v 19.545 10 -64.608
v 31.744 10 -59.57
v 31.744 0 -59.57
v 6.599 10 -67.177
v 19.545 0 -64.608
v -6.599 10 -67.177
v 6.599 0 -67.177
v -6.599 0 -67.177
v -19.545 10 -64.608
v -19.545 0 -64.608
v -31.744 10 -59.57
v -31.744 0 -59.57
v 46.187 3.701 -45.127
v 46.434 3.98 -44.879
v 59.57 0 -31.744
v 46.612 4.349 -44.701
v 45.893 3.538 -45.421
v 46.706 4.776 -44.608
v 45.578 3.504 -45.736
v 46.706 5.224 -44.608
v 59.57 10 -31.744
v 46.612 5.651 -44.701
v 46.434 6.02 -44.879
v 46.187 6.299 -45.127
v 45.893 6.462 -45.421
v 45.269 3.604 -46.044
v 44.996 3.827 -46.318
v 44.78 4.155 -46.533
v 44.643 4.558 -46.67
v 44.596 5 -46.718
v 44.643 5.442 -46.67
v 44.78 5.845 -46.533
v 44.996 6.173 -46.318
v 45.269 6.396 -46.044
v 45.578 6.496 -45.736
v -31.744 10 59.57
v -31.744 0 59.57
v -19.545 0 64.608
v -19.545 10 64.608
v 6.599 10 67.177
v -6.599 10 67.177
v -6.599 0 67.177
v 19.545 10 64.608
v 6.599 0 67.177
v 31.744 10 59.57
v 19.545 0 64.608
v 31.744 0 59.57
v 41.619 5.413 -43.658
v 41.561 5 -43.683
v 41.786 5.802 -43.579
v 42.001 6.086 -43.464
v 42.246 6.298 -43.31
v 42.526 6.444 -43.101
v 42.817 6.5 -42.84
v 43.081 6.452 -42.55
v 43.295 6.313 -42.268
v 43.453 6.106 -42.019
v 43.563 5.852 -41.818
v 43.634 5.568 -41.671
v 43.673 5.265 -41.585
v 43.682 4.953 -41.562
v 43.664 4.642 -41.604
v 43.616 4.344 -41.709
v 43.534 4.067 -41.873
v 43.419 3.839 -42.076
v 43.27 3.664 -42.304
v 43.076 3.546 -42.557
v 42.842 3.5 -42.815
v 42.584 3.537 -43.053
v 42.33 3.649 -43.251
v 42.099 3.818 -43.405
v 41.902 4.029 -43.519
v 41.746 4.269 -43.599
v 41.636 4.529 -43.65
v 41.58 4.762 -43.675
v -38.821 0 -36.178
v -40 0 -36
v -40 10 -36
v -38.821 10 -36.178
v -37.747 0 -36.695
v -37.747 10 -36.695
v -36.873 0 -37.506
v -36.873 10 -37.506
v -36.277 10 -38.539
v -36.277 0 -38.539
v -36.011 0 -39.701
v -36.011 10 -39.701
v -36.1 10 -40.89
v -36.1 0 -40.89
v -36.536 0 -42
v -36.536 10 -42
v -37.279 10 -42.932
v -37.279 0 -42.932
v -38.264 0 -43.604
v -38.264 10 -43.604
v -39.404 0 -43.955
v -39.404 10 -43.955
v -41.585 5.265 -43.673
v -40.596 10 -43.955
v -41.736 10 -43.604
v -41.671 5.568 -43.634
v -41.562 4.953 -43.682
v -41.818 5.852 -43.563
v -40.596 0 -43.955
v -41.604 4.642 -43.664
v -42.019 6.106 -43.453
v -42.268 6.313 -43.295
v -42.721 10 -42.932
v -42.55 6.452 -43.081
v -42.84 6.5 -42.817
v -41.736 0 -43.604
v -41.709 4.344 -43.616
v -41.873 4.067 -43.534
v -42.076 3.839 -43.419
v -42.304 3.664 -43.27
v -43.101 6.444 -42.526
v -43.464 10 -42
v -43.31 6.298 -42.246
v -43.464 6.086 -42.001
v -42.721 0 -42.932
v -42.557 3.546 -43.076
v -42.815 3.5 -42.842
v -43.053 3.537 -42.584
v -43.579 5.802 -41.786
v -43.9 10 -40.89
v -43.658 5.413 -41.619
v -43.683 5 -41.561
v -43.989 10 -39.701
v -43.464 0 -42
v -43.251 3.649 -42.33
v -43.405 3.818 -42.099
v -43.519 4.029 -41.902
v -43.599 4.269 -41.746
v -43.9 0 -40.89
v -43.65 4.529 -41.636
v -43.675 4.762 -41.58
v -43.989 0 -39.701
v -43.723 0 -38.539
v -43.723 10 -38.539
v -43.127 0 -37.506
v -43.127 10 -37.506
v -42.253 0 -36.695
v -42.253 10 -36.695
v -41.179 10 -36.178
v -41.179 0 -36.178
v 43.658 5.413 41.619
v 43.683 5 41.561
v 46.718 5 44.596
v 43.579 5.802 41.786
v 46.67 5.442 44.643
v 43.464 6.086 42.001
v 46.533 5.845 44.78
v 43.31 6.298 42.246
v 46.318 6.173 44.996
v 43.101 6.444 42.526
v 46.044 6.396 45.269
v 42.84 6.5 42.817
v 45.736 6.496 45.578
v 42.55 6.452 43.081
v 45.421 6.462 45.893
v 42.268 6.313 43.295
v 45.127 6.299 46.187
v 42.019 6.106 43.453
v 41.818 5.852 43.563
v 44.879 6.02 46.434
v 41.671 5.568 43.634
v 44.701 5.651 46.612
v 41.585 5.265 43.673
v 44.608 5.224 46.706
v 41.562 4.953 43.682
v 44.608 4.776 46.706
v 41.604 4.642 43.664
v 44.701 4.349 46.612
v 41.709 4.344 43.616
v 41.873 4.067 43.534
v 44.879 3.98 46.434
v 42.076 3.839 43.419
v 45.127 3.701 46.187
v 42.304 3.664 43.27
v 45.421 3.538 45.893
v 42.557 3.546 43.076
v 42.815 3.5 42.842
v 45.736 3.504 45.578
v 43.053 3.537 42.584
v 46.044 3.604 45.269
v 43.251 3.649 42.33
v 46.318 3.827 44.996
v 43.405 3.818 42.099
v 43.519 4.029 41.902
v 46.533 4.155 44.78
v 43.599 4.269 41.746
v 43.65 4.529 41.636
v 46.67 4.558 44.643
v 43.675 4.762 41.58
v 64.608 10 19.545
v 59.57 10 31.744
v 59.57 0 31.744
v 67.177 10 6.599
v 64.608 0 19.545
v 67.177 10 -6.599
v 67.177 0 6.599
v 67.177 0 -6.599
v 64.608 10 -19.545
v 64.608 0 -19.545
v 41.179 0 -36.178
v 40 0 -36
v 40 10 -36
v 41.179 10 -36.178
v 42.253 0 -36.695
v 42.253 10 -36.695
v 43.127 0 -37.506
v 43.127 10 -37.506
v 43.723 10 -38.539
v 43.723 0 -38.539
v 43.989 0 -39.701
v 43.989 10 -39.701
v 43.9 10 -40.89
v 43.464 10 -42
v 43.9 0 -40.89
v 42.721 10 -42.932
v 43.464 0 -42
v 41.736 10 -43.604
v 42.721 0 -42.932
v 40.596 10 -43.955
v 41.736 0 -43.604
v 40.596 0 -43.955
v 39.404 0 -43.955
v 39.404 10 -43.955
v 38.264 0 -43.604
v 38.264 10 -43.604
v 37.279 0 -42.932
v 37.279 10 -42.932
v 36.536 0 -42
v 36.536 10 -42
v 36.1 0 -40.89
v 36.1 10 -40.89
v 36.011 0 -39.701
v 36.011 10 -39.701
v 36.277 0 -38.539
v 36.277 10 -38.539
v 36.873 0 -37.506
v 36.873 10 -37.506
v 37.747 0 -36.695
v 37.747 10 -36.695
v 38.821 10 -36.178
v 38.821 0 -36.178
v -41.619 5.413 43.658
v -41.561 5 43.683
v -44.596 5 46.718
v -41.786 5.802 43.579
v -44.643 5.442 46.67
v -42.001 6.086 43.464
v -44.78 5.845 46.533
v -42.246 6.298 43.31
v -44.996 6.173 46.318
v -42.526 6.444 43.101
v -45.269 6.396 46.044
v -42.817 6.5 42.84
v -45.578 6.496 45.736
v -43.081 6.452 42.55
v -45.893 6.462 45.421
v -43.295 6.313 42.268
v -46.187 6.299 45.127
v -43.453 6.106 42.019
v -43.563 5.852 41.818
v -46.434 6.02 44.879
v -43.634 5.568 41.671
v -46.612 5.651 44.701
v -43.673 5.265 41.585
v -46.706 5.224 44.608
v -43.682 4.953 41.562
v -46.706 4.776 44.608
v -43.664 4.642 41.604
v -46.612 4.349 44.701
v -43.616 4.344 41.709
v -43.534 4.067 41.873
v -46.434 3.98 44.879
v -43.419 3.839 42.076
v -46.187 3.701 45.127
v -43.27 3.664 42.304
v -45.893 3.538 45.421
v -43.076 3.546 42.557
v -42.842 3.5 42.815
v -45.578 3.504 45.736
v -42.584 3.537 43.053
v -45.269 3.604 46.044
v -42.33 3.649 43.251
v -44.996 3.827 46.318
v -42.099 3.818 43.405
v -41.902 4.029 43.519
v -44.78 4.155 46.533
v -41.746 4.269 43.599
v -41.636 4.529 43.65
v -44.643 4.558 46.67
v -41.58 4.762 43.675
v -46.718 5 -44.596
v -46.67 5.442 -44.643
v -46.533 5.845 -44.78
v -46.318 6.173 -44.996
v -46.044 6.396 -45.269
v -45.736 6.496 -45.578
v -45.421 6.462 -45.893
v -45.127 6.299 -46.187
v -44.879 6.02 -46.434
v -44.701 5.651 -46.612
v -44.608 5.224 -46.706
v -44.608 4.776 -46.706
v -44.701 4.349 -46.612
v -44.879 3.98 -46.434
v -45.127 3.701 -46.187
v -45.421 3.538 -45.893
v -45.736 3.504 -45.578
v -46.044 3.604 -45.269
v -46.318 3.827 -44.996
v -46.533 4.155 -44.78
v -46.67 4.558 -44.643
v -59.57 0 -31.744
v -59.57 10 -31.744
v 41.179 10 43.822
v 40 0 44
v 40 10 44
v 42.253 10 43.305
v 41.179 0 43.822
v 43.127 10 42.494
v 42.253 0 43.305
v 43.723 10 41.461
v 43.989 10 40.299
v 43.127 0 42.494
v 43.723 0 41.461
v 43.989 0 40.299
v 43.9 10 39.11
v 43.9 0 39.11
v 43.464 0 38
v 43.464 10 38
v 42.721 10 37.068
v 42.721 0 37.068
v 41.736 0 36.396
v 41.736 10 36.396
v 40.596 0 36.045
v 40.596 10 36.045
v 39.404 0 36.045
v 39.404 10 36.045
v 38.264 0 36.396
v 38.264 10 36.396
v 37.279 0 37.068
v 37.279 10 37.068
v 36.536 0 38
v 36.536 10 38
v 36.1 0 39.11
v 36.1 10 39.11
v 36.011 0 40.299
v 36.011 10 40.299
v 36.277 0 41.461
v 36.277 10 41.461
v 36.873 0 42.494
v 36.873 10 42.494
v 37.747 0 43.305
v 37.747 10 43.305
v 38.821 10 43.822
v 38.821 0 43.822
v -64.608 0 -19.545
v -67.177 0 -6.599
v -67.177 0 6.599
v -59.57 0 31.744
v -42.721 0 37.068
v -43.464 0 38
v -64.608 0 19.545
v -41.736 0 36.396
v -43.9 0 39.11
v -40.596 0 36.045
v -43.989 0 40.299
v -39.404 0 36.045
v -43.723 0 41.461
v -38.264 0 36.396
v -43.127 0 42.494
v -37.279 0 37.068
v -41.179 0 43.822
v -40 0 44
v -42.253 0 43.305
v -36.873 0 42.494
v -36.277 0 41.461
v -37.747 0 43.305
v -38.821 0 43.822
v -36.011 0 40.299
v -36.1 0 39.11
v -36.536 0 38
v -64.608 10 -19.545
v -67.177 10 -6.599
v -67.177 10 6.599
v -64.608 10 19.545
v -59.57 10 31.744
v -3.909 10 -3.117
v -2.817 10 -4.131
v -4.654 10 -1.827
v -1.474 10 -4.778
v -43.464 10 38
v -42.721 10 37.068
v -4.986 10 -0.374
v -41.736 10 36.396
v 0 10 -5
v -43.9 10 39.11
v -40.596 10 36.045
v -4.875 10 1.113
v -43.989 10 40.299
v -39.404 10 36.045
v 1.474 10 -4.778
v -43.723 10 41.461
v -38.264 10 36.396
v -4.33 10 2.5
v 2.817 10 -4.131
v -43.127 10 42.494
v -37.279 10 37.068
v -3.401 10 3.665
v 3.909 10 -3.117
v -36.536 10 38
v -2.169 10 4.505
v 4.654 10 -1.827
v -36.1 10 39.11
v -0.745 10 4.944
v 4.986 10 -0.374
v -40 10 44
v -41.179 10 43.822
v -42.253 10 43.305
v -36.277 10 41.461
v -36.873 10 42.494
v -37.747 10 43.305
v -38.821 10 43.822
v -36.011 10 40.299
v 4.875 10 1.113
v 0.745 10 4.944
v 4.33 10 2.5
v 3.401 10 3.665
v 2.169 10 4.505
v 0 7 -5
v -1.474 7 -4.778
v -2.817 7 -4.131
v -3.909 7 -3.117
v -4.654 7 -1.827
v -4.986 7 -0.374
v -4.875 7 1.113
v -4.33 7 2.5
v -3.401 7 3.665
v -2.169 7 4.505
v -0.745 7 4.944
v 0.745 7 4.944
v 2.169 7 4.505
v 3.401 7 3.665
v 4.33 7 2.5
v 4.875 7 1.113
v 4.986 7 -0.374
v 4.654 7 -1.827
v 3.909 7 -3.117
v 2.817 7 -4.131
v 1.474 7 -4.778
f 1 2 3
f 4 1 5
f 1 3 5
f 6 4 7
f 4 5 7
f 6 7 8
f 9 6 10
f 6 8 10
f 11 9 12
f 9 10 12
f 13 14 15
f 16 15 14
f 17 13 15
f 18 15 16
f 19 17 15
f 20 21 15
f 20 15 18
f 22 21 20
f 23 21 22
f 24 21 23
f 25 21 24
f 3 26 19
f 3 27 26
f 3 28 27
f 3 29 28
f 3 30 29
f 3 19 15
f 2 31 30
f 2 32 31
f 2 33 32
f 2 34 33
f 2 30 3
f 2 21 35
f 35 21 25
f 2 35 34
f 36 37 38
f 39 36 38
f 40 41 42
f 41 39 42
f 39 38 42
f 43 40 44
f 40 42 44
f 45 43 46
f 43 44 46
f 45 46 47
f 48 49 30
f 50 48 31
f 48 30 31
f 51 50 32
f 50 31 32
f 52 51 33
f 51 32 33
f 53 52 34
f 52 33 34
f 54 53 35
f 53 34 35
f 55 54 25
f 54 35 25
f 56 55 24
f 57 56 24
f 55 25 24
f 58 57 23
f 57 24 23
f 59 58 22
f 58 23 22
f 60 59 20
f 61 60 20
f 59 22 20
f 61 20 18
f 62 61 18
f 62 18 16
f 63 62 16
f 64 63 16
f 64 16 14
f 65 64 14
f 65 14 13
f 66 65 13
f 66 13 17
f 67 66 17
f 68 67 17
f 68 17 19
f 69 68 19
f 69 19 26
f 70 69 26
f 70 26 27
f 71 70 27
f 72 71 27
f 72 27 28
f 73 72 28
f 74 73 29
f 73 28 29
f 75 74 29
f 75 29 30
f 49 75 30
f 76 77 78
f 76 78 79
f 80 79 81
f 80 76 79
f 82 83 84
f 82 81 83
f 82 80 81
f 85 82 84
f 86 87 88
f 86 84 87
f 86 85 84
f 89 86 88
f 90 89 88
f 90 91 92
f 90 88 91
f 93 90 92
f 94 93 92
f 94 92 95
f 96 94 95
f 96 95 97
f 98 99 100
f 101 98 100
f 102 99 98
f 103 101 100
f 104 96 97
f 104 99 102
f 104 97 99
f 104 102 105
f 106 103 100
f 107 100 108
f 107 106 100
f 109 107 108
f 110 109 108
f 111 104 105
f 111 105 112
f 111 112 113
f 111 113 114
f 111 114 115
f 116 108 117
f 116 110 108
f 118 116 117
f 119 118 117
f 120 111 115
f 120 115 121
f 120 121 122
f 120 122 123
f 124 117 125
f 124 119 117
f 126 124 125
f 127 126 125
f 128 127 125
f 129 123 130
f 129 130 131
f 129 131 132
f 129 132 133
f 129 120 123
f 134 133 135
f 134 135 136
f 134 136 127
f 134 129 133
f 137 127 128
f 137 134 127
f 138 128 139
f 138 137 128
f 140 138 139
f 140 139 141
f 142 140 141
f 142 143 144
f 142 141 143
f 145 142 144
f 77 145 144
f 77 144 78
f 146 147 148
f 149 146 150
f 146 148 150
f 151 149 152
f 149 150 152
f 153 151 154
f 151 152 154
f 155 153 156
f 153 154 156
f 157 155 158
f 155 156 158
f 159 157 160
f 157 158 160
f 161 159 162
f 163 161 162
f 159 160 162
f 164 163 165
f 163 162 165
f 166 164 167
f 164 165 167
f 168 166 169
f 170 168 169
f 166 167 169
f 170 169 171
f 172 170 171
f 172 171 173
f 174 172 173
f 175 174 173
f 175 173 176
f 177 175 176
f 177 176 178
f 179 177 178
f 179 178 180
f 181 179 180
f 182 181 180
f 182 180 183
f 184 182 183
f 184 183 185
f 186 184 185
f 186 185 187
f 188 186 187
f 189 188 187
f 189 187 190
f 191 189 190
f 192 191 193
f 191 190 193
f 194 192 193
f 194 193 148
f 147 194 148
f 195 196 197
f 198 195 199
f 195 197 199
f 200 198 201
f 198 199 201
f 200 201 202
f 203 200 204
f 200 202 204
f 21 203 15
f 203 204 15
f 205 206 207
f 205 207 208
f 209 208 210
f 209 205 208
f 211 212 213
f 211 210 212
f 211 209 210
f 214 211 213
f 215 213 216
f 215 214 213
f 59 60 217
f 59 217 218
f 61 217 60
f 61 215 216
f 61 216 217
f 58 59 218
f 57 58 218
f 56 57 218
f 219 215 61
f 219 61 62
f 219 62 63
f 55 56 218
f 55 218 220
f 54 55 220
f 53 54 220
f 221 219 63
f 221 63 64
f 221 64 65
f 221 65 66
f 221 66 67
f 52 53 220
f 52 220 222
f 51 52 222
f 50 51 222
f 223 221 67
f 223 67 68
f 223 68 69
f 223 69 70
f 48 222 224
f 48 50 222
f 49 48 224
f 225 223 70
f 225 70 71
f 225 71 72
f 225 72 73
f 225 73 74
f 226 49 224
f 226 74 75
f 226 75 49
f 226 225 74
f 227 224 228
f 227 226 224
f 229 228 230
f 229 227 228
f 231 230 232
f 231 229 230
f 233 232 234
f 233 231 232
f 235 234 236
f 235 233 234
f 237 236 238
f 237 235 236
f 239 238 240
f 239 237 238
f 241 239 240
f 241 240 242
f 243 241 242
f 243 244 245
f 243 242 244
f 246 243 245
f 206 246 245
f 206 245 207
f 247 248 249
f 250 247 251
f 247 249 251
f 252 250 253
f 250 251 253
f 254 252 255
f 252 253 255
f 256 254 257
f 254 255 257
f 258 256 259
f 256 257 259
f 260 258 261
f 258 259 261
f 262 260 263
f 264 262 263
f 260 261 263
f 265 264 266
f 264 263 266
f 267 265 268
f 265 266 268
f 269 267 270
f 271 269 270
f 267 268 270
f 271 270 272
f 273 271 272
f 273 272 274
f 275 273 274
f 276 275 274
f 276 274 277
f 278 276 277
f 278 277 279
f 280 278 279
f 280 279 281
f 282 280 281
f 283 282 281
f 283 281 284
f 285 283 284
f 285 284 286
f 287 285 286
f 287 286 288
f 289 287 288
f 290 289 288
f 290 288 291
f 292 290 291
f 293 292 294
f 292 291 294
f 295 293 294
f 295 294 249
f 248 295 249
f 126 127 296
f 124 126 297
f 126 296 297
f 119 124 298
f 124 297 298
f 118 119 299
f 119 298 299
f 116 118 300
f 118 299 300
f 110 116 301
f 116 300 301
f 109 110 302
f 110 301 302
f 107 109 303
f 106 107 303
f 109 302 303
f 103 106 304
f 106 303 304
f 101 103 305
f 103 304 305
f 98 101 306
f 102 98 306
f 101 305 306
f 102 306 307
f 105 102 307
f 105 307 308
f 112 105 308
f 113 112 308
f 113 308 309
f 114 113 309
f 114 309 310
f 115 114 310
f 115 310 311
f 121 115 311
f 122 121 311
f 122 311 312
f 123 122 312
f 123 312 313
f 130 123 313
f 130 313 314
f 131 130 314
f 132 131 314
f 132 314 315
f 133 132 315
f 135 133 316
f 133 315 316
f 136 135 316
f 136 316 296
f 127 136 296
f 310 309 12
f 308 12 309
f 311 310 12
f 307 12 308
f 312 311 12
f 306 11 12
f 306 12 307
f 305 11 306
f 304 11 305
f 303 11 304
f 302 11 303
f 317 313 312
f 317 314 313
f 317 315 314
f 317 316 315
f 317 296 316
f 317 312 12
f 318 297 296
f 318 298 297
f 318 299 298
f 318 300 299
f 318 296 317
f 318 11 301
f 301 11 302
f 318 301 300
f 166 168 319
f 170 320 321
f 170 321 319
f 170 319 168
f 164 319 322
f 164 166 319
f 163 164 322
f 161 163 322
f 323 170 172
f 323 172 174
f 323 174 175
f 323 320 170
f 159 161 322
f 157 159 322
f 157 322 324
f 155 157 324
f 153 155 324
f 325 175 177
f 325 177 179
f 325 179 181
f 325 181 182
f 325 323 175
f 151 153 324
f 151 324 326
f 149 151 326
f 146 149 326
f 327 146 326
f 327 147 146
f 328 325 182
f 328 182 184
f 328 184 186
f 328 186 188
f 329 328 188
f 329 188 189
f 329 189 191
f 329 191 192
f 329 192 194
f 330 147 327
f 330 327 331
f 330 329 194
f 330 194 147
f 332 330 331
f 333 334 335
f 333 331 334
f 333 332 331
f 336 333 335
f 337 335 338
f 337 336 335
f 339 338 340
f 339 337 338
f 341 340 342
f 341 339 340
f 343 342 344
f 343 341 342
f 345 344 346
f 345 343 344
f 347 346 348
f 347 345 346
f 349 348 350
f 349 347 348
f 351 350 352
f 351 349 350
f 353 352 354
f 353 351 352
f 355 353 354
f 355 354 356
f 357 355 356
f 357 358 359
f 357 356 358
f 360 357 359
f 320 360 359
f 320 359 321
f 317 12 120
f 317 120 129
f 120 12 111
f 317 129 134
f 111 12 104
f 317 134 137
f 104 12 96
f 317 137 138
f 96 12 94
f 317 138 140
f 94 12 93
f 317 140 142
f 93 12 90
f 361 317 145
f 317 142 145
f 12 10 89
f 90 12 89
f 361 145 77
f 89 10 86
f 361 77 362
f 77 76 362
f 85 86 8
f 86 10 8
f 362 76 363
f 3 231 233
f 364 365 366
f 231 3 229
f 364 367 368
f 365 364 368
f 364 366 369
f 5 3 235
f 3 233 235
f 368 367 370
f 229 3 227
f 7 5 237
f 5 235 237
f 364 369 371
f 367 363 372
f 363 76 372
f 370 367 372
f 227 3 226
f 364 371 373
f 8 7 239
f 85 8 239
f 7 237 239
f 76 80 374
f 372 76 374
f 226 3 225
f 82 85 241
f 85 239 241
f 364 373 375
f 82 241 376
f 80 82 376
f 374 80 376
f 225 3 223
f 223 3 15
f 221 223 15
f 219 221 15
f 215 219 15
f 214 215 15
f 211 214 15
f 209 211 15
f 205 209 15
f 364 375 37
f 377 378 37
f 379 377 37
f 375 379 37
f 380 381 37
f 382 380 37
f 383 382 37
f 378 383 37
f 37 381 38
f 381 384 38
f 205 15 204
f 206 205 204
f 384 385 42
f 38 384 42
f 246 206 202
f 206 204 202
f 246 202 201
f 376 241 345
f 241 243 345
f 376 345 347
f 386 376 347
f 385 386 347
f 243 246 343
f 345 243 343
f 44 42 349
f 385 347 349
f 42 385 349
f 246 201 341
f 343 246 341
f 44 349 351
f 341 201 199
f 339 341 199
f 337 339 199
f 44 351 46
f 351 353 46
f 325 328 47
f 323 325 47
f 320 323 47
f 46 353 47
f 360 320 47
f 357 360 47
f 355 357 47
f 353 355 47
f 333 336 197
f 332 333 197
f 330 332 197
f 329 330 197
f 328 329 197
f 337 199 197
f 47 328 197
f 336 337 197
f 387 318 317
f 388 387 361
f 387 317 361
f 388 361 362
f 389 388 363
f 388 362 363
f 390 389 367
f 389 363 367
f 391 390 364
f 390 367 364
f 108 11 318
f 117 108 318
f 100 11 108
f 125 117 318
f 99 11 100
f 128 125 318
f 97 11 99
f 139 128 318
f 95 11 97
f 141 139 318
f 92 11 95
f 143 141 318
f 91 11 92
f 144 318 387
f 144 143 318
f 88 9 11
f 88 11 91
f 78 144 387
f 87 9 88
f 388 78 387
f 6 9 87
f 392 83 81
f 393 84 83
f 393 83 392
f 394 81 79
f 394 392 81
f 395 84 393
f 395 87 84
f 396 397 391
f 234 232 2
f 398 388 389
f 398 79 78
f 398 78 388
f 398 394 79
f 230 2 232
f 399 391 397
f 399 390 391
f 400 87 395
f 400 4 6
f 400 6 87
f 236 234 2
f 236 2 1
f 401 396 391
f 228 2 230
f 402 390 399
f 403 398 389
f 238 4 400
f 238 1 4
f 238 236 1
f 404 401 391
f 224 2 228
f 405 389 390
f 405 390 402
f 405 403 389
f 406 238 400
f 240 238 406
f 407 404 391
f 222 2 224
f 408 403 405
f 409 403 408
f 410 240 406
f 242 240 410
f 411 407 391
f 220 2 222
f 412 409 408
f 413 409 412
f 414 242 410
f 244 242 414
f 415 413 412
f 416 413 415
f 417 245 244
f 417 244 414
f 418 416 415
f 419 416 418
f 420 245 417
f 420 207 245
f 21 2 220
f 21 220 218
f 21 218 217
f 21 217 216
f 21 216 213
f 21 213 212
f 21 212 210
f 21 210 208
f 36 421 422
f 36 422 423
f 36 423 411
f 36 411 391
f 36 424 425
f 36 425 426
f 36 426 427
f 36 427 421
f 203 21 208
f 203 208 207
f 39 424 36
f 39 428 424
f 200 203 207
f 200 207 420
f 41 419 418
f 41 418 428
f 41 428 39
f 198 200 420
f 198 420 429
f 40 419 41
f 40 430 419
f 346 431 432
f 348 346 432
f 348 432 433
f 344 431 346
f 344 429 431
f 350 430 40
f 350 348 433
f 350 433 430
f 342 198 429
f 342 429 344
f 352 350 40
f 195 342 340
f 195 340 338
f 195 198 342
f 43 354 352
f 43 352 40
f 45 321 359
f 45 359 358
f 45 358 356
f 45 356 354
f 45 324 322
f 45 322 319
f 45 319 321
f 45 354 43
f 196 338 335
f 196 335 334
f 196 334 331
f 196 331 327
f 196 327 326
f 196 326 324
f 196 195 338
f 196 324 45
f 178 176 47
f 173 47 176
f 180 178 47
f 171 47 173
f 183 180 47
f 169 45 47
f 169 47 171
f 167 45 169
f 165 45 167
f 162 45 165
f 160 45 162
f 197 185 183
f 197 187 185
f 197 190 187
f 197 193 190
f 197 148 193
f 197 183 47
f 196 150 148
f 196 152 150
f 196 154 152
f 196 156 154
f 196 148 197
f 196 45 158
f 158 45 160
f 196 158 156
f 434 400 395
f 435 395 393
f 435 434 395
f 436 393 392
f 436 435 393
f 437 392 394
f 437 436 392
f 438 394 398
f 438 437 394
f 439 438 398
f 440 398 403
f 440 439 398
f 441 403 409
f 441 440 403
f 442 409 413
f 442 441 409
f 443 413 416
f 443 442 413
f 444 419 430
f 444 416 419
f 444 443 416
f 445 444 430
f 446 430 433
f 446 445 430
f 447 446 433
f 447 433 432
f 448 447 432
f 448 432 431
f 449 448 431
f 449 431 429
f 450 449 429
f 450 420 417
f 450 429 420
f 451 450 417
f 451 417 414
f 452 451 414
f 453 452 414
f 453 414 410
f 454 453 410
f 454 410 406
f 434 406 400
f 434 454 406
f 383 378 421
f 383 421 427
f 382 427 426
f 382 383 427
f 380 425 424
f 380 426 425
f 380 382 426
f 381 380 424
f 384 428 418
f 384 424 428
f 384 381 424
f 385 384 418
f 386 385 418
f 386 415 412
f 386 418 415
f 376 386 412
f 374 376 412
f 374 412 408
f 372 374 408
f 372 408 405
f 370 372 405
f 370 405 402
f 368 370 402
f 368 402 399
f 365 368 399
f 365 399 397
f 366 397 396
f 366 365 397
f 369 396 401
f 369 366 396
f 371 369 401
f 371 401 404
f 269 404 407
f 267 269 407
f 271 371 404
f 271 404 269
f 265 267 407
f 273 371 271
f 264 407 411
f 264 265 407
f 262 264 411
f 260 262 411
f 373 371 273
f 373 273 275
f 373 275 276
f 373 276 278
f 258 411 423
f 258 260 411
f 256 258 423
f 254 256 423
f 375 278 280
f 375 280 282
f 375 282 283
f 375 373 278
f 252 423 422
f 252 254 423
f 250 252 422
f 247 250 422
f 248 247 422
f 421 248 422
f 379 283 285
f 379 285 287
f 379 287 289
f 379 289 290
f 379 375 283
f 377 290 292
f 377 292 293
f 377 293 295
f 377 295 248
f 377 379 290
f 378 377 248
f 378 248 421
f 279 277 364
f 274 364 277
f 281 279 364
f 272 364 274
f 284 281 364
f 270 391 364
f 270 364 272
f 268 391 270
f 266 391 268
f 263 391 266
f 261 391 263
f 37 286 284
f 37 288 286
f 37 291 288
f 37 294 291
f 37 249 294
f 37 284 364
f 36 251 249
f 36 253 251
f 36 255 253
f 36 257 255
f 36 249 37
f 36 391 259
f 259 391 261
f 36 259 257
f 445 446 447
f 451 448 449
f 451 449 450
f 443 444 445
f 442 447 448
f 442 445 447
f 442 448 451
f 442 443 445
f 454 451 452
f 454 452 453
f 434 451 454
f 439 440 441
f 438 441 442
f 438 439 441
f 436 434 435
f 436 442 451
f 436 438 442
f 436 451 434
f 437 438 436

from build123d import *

# Parameters (mm, degrees)
SKETCH1_R                  = 67.5
BOSS_EXTRUDE1_DEPTH        = 10
CUT_EXTRUDE1_DEPTH         = 96.981769102
CUT_EXTRUDE1_DEPTH_BACK    = 96.981769102
SKETCH4_R                  = 4
CUT_EXTRUDE_THIN1_DEPTH    = 96.981769102
F_3_0MM_DOWEL_HOLE1_REACH  = 162.34
F_3_0MM_DOWEL_HOLE1_BORE_R = 1.5
CIRPATTERN1_COUNT          = 4
CUT_EXTRUDE2_DEPTH         = 96.981769113
CUT_EXTRUDE2_DEPTH_BACK    = 3
SKETCH8_R                  = 5


with BuildPart() as part:
    # Sketch1 → Boss-Extrude1 (new body)
    with BuildSketch(Plane(origin=(0, 0, 0), x_dir=(1, 0, 0), z_dir=(0, 1, 0))):
        with Locations(Location((0, 0, 0), (0, 0, 270))):
            Circle(SKETCH1_R)
    extrude(amount=BOSS_EXTRUDE1_DEPTH)

    # Sketch4 → Cut-Extrude1 (cut, two sides: drawn at the far end of the back side and taken through both)
    with BuildSketch(Plane(origin=(0, 10, 0), x_dir=(1, 0, 0), z_dir=(0, 1, 0)).offset(-CUT_EXTRUDE1_DEPTH_BACK)):
        with Locations(Location((-40, 40, 0), (0, 0, 270))):
            Circle(SKETCH4_R)
        with Locations(Location((40, 40, 0), (0, 0, 270))):
            Circle(SKETCH4_R)
        with Locations(Location((40, -40, 0), (0, 0, 270))):
            Circle(SKETCH4_R)
        with Locations(Location((-40, -40, 0), (0, 0, 270))):
            Circle(SKETCH4_R)
    extrude(amount=CUT_EXTRUDE1_DEPTH + CUT_EXTRUDE1_DEPTH_BACK, mode=Mode.SUBTRACT)

    # Sketch5 → Cut-Extrude-Thin1 (cut, through all)
    with BuildSketch(Plane(origin=(0, 10, 0), x_dir=(1, 0, 0), z_dir=(0, 1, 0))):
        Polygon((-31.743671291, 59.570037208), (-59.570037208, 31.743671291), (-66.64110502, 38.814739103), (-38.814739103, 66.64110502), align=None)
        Polygon((59.570037208, 31.743671291), (31.743671291, 59.570037208), (38.814739103, 66.64110502), (66.64110502, 38.814739103), align=None)
        Polygon((31.743671291, -59.570037208), (59.570037208, -31.743671291), (66.64110502, -38.814739103), (38.814739103, -66.64110502), align=None)
        Polygon((-59.570037208, -31.743671291), (-31.743671291, -59.570037208), (-38.814739103, -66.64110502), (-66.64110502, -38.814739103), align=None)
    extrude(amount=-CUT_EXTRUDE_THIN1_DEPTH, mode=Mode.SUBTRACT)

    # Ø3.0mm Dowel Hole1 bore → Ø3.0mm Dowel Hole1 (cut, up to next)
    with BuildSketch(Plane(origin=(45.656854249, 0, 45.656854249), x_dir=(0.7071067811865479, 0, -0.7071067811865471), z_dir=(0.7071067811865471, 0, 0.7071067811865479)), mode=Mode.PRIVATE) as f_3_0mm_dowel_hole1_sk1:
        with Locations((0, 5)):
            Circle(F_3_0MM_DOWEL_HOLE1_BORE_R)
    f_3_0mm_dowel_hole1_tool1 = extrude(f_3_0mm_dowel_hole1_sk1.sketch, amount=-F_3_0MM_DOWEL_HOLE1_REACH, mode=Mode.PRIVATE) & part.part
    f_3_0mm_dowel_hole1 = f_3_0mm_dowel_hole1_tool1.solids().sort_by_distance((45.656854, 5, 45.656854))[0]
    add(f_3_0mm_dowel_hole1, mode=Mode.SUBTRACT)

    # CirPattern1: Ø3.0mm Dowel Hole1 ×4 about axis
    cirpattern1_axis = Axis((0, 10, 0), (0, -1, 0))
    for i in range(1, CIRPATTERN1_COUNT):
        add(f_3_0mm_dowel_hole1.rotate(cirpattern1_axis, i * 360 / CIRPATTERN1_COUNT), mode=Mode.SUBTRACT)

    # Sketch8 → Cut-Extrude2 (cut, two sides: drawn at the far end of the back side and taken through both)
    with BuildSketch(Plane(origin=(0, 10, 0), x_dir=(1, 0, 0), z_dir=(0, 1, 0)).offset(-CUT_EXTRUDE2_DEPTH_BACK)):
        with Locations(Location((0, 0, 0), (0, 0, 90))):
            Circle(SKETCH8_R)
    extrude(amount=CUT_EXTRUDE2_DEPTH + CUT_EXTRUDE2_DEPTH_BACK, mode=Mode.SUBTRACT)


solid = part.part
